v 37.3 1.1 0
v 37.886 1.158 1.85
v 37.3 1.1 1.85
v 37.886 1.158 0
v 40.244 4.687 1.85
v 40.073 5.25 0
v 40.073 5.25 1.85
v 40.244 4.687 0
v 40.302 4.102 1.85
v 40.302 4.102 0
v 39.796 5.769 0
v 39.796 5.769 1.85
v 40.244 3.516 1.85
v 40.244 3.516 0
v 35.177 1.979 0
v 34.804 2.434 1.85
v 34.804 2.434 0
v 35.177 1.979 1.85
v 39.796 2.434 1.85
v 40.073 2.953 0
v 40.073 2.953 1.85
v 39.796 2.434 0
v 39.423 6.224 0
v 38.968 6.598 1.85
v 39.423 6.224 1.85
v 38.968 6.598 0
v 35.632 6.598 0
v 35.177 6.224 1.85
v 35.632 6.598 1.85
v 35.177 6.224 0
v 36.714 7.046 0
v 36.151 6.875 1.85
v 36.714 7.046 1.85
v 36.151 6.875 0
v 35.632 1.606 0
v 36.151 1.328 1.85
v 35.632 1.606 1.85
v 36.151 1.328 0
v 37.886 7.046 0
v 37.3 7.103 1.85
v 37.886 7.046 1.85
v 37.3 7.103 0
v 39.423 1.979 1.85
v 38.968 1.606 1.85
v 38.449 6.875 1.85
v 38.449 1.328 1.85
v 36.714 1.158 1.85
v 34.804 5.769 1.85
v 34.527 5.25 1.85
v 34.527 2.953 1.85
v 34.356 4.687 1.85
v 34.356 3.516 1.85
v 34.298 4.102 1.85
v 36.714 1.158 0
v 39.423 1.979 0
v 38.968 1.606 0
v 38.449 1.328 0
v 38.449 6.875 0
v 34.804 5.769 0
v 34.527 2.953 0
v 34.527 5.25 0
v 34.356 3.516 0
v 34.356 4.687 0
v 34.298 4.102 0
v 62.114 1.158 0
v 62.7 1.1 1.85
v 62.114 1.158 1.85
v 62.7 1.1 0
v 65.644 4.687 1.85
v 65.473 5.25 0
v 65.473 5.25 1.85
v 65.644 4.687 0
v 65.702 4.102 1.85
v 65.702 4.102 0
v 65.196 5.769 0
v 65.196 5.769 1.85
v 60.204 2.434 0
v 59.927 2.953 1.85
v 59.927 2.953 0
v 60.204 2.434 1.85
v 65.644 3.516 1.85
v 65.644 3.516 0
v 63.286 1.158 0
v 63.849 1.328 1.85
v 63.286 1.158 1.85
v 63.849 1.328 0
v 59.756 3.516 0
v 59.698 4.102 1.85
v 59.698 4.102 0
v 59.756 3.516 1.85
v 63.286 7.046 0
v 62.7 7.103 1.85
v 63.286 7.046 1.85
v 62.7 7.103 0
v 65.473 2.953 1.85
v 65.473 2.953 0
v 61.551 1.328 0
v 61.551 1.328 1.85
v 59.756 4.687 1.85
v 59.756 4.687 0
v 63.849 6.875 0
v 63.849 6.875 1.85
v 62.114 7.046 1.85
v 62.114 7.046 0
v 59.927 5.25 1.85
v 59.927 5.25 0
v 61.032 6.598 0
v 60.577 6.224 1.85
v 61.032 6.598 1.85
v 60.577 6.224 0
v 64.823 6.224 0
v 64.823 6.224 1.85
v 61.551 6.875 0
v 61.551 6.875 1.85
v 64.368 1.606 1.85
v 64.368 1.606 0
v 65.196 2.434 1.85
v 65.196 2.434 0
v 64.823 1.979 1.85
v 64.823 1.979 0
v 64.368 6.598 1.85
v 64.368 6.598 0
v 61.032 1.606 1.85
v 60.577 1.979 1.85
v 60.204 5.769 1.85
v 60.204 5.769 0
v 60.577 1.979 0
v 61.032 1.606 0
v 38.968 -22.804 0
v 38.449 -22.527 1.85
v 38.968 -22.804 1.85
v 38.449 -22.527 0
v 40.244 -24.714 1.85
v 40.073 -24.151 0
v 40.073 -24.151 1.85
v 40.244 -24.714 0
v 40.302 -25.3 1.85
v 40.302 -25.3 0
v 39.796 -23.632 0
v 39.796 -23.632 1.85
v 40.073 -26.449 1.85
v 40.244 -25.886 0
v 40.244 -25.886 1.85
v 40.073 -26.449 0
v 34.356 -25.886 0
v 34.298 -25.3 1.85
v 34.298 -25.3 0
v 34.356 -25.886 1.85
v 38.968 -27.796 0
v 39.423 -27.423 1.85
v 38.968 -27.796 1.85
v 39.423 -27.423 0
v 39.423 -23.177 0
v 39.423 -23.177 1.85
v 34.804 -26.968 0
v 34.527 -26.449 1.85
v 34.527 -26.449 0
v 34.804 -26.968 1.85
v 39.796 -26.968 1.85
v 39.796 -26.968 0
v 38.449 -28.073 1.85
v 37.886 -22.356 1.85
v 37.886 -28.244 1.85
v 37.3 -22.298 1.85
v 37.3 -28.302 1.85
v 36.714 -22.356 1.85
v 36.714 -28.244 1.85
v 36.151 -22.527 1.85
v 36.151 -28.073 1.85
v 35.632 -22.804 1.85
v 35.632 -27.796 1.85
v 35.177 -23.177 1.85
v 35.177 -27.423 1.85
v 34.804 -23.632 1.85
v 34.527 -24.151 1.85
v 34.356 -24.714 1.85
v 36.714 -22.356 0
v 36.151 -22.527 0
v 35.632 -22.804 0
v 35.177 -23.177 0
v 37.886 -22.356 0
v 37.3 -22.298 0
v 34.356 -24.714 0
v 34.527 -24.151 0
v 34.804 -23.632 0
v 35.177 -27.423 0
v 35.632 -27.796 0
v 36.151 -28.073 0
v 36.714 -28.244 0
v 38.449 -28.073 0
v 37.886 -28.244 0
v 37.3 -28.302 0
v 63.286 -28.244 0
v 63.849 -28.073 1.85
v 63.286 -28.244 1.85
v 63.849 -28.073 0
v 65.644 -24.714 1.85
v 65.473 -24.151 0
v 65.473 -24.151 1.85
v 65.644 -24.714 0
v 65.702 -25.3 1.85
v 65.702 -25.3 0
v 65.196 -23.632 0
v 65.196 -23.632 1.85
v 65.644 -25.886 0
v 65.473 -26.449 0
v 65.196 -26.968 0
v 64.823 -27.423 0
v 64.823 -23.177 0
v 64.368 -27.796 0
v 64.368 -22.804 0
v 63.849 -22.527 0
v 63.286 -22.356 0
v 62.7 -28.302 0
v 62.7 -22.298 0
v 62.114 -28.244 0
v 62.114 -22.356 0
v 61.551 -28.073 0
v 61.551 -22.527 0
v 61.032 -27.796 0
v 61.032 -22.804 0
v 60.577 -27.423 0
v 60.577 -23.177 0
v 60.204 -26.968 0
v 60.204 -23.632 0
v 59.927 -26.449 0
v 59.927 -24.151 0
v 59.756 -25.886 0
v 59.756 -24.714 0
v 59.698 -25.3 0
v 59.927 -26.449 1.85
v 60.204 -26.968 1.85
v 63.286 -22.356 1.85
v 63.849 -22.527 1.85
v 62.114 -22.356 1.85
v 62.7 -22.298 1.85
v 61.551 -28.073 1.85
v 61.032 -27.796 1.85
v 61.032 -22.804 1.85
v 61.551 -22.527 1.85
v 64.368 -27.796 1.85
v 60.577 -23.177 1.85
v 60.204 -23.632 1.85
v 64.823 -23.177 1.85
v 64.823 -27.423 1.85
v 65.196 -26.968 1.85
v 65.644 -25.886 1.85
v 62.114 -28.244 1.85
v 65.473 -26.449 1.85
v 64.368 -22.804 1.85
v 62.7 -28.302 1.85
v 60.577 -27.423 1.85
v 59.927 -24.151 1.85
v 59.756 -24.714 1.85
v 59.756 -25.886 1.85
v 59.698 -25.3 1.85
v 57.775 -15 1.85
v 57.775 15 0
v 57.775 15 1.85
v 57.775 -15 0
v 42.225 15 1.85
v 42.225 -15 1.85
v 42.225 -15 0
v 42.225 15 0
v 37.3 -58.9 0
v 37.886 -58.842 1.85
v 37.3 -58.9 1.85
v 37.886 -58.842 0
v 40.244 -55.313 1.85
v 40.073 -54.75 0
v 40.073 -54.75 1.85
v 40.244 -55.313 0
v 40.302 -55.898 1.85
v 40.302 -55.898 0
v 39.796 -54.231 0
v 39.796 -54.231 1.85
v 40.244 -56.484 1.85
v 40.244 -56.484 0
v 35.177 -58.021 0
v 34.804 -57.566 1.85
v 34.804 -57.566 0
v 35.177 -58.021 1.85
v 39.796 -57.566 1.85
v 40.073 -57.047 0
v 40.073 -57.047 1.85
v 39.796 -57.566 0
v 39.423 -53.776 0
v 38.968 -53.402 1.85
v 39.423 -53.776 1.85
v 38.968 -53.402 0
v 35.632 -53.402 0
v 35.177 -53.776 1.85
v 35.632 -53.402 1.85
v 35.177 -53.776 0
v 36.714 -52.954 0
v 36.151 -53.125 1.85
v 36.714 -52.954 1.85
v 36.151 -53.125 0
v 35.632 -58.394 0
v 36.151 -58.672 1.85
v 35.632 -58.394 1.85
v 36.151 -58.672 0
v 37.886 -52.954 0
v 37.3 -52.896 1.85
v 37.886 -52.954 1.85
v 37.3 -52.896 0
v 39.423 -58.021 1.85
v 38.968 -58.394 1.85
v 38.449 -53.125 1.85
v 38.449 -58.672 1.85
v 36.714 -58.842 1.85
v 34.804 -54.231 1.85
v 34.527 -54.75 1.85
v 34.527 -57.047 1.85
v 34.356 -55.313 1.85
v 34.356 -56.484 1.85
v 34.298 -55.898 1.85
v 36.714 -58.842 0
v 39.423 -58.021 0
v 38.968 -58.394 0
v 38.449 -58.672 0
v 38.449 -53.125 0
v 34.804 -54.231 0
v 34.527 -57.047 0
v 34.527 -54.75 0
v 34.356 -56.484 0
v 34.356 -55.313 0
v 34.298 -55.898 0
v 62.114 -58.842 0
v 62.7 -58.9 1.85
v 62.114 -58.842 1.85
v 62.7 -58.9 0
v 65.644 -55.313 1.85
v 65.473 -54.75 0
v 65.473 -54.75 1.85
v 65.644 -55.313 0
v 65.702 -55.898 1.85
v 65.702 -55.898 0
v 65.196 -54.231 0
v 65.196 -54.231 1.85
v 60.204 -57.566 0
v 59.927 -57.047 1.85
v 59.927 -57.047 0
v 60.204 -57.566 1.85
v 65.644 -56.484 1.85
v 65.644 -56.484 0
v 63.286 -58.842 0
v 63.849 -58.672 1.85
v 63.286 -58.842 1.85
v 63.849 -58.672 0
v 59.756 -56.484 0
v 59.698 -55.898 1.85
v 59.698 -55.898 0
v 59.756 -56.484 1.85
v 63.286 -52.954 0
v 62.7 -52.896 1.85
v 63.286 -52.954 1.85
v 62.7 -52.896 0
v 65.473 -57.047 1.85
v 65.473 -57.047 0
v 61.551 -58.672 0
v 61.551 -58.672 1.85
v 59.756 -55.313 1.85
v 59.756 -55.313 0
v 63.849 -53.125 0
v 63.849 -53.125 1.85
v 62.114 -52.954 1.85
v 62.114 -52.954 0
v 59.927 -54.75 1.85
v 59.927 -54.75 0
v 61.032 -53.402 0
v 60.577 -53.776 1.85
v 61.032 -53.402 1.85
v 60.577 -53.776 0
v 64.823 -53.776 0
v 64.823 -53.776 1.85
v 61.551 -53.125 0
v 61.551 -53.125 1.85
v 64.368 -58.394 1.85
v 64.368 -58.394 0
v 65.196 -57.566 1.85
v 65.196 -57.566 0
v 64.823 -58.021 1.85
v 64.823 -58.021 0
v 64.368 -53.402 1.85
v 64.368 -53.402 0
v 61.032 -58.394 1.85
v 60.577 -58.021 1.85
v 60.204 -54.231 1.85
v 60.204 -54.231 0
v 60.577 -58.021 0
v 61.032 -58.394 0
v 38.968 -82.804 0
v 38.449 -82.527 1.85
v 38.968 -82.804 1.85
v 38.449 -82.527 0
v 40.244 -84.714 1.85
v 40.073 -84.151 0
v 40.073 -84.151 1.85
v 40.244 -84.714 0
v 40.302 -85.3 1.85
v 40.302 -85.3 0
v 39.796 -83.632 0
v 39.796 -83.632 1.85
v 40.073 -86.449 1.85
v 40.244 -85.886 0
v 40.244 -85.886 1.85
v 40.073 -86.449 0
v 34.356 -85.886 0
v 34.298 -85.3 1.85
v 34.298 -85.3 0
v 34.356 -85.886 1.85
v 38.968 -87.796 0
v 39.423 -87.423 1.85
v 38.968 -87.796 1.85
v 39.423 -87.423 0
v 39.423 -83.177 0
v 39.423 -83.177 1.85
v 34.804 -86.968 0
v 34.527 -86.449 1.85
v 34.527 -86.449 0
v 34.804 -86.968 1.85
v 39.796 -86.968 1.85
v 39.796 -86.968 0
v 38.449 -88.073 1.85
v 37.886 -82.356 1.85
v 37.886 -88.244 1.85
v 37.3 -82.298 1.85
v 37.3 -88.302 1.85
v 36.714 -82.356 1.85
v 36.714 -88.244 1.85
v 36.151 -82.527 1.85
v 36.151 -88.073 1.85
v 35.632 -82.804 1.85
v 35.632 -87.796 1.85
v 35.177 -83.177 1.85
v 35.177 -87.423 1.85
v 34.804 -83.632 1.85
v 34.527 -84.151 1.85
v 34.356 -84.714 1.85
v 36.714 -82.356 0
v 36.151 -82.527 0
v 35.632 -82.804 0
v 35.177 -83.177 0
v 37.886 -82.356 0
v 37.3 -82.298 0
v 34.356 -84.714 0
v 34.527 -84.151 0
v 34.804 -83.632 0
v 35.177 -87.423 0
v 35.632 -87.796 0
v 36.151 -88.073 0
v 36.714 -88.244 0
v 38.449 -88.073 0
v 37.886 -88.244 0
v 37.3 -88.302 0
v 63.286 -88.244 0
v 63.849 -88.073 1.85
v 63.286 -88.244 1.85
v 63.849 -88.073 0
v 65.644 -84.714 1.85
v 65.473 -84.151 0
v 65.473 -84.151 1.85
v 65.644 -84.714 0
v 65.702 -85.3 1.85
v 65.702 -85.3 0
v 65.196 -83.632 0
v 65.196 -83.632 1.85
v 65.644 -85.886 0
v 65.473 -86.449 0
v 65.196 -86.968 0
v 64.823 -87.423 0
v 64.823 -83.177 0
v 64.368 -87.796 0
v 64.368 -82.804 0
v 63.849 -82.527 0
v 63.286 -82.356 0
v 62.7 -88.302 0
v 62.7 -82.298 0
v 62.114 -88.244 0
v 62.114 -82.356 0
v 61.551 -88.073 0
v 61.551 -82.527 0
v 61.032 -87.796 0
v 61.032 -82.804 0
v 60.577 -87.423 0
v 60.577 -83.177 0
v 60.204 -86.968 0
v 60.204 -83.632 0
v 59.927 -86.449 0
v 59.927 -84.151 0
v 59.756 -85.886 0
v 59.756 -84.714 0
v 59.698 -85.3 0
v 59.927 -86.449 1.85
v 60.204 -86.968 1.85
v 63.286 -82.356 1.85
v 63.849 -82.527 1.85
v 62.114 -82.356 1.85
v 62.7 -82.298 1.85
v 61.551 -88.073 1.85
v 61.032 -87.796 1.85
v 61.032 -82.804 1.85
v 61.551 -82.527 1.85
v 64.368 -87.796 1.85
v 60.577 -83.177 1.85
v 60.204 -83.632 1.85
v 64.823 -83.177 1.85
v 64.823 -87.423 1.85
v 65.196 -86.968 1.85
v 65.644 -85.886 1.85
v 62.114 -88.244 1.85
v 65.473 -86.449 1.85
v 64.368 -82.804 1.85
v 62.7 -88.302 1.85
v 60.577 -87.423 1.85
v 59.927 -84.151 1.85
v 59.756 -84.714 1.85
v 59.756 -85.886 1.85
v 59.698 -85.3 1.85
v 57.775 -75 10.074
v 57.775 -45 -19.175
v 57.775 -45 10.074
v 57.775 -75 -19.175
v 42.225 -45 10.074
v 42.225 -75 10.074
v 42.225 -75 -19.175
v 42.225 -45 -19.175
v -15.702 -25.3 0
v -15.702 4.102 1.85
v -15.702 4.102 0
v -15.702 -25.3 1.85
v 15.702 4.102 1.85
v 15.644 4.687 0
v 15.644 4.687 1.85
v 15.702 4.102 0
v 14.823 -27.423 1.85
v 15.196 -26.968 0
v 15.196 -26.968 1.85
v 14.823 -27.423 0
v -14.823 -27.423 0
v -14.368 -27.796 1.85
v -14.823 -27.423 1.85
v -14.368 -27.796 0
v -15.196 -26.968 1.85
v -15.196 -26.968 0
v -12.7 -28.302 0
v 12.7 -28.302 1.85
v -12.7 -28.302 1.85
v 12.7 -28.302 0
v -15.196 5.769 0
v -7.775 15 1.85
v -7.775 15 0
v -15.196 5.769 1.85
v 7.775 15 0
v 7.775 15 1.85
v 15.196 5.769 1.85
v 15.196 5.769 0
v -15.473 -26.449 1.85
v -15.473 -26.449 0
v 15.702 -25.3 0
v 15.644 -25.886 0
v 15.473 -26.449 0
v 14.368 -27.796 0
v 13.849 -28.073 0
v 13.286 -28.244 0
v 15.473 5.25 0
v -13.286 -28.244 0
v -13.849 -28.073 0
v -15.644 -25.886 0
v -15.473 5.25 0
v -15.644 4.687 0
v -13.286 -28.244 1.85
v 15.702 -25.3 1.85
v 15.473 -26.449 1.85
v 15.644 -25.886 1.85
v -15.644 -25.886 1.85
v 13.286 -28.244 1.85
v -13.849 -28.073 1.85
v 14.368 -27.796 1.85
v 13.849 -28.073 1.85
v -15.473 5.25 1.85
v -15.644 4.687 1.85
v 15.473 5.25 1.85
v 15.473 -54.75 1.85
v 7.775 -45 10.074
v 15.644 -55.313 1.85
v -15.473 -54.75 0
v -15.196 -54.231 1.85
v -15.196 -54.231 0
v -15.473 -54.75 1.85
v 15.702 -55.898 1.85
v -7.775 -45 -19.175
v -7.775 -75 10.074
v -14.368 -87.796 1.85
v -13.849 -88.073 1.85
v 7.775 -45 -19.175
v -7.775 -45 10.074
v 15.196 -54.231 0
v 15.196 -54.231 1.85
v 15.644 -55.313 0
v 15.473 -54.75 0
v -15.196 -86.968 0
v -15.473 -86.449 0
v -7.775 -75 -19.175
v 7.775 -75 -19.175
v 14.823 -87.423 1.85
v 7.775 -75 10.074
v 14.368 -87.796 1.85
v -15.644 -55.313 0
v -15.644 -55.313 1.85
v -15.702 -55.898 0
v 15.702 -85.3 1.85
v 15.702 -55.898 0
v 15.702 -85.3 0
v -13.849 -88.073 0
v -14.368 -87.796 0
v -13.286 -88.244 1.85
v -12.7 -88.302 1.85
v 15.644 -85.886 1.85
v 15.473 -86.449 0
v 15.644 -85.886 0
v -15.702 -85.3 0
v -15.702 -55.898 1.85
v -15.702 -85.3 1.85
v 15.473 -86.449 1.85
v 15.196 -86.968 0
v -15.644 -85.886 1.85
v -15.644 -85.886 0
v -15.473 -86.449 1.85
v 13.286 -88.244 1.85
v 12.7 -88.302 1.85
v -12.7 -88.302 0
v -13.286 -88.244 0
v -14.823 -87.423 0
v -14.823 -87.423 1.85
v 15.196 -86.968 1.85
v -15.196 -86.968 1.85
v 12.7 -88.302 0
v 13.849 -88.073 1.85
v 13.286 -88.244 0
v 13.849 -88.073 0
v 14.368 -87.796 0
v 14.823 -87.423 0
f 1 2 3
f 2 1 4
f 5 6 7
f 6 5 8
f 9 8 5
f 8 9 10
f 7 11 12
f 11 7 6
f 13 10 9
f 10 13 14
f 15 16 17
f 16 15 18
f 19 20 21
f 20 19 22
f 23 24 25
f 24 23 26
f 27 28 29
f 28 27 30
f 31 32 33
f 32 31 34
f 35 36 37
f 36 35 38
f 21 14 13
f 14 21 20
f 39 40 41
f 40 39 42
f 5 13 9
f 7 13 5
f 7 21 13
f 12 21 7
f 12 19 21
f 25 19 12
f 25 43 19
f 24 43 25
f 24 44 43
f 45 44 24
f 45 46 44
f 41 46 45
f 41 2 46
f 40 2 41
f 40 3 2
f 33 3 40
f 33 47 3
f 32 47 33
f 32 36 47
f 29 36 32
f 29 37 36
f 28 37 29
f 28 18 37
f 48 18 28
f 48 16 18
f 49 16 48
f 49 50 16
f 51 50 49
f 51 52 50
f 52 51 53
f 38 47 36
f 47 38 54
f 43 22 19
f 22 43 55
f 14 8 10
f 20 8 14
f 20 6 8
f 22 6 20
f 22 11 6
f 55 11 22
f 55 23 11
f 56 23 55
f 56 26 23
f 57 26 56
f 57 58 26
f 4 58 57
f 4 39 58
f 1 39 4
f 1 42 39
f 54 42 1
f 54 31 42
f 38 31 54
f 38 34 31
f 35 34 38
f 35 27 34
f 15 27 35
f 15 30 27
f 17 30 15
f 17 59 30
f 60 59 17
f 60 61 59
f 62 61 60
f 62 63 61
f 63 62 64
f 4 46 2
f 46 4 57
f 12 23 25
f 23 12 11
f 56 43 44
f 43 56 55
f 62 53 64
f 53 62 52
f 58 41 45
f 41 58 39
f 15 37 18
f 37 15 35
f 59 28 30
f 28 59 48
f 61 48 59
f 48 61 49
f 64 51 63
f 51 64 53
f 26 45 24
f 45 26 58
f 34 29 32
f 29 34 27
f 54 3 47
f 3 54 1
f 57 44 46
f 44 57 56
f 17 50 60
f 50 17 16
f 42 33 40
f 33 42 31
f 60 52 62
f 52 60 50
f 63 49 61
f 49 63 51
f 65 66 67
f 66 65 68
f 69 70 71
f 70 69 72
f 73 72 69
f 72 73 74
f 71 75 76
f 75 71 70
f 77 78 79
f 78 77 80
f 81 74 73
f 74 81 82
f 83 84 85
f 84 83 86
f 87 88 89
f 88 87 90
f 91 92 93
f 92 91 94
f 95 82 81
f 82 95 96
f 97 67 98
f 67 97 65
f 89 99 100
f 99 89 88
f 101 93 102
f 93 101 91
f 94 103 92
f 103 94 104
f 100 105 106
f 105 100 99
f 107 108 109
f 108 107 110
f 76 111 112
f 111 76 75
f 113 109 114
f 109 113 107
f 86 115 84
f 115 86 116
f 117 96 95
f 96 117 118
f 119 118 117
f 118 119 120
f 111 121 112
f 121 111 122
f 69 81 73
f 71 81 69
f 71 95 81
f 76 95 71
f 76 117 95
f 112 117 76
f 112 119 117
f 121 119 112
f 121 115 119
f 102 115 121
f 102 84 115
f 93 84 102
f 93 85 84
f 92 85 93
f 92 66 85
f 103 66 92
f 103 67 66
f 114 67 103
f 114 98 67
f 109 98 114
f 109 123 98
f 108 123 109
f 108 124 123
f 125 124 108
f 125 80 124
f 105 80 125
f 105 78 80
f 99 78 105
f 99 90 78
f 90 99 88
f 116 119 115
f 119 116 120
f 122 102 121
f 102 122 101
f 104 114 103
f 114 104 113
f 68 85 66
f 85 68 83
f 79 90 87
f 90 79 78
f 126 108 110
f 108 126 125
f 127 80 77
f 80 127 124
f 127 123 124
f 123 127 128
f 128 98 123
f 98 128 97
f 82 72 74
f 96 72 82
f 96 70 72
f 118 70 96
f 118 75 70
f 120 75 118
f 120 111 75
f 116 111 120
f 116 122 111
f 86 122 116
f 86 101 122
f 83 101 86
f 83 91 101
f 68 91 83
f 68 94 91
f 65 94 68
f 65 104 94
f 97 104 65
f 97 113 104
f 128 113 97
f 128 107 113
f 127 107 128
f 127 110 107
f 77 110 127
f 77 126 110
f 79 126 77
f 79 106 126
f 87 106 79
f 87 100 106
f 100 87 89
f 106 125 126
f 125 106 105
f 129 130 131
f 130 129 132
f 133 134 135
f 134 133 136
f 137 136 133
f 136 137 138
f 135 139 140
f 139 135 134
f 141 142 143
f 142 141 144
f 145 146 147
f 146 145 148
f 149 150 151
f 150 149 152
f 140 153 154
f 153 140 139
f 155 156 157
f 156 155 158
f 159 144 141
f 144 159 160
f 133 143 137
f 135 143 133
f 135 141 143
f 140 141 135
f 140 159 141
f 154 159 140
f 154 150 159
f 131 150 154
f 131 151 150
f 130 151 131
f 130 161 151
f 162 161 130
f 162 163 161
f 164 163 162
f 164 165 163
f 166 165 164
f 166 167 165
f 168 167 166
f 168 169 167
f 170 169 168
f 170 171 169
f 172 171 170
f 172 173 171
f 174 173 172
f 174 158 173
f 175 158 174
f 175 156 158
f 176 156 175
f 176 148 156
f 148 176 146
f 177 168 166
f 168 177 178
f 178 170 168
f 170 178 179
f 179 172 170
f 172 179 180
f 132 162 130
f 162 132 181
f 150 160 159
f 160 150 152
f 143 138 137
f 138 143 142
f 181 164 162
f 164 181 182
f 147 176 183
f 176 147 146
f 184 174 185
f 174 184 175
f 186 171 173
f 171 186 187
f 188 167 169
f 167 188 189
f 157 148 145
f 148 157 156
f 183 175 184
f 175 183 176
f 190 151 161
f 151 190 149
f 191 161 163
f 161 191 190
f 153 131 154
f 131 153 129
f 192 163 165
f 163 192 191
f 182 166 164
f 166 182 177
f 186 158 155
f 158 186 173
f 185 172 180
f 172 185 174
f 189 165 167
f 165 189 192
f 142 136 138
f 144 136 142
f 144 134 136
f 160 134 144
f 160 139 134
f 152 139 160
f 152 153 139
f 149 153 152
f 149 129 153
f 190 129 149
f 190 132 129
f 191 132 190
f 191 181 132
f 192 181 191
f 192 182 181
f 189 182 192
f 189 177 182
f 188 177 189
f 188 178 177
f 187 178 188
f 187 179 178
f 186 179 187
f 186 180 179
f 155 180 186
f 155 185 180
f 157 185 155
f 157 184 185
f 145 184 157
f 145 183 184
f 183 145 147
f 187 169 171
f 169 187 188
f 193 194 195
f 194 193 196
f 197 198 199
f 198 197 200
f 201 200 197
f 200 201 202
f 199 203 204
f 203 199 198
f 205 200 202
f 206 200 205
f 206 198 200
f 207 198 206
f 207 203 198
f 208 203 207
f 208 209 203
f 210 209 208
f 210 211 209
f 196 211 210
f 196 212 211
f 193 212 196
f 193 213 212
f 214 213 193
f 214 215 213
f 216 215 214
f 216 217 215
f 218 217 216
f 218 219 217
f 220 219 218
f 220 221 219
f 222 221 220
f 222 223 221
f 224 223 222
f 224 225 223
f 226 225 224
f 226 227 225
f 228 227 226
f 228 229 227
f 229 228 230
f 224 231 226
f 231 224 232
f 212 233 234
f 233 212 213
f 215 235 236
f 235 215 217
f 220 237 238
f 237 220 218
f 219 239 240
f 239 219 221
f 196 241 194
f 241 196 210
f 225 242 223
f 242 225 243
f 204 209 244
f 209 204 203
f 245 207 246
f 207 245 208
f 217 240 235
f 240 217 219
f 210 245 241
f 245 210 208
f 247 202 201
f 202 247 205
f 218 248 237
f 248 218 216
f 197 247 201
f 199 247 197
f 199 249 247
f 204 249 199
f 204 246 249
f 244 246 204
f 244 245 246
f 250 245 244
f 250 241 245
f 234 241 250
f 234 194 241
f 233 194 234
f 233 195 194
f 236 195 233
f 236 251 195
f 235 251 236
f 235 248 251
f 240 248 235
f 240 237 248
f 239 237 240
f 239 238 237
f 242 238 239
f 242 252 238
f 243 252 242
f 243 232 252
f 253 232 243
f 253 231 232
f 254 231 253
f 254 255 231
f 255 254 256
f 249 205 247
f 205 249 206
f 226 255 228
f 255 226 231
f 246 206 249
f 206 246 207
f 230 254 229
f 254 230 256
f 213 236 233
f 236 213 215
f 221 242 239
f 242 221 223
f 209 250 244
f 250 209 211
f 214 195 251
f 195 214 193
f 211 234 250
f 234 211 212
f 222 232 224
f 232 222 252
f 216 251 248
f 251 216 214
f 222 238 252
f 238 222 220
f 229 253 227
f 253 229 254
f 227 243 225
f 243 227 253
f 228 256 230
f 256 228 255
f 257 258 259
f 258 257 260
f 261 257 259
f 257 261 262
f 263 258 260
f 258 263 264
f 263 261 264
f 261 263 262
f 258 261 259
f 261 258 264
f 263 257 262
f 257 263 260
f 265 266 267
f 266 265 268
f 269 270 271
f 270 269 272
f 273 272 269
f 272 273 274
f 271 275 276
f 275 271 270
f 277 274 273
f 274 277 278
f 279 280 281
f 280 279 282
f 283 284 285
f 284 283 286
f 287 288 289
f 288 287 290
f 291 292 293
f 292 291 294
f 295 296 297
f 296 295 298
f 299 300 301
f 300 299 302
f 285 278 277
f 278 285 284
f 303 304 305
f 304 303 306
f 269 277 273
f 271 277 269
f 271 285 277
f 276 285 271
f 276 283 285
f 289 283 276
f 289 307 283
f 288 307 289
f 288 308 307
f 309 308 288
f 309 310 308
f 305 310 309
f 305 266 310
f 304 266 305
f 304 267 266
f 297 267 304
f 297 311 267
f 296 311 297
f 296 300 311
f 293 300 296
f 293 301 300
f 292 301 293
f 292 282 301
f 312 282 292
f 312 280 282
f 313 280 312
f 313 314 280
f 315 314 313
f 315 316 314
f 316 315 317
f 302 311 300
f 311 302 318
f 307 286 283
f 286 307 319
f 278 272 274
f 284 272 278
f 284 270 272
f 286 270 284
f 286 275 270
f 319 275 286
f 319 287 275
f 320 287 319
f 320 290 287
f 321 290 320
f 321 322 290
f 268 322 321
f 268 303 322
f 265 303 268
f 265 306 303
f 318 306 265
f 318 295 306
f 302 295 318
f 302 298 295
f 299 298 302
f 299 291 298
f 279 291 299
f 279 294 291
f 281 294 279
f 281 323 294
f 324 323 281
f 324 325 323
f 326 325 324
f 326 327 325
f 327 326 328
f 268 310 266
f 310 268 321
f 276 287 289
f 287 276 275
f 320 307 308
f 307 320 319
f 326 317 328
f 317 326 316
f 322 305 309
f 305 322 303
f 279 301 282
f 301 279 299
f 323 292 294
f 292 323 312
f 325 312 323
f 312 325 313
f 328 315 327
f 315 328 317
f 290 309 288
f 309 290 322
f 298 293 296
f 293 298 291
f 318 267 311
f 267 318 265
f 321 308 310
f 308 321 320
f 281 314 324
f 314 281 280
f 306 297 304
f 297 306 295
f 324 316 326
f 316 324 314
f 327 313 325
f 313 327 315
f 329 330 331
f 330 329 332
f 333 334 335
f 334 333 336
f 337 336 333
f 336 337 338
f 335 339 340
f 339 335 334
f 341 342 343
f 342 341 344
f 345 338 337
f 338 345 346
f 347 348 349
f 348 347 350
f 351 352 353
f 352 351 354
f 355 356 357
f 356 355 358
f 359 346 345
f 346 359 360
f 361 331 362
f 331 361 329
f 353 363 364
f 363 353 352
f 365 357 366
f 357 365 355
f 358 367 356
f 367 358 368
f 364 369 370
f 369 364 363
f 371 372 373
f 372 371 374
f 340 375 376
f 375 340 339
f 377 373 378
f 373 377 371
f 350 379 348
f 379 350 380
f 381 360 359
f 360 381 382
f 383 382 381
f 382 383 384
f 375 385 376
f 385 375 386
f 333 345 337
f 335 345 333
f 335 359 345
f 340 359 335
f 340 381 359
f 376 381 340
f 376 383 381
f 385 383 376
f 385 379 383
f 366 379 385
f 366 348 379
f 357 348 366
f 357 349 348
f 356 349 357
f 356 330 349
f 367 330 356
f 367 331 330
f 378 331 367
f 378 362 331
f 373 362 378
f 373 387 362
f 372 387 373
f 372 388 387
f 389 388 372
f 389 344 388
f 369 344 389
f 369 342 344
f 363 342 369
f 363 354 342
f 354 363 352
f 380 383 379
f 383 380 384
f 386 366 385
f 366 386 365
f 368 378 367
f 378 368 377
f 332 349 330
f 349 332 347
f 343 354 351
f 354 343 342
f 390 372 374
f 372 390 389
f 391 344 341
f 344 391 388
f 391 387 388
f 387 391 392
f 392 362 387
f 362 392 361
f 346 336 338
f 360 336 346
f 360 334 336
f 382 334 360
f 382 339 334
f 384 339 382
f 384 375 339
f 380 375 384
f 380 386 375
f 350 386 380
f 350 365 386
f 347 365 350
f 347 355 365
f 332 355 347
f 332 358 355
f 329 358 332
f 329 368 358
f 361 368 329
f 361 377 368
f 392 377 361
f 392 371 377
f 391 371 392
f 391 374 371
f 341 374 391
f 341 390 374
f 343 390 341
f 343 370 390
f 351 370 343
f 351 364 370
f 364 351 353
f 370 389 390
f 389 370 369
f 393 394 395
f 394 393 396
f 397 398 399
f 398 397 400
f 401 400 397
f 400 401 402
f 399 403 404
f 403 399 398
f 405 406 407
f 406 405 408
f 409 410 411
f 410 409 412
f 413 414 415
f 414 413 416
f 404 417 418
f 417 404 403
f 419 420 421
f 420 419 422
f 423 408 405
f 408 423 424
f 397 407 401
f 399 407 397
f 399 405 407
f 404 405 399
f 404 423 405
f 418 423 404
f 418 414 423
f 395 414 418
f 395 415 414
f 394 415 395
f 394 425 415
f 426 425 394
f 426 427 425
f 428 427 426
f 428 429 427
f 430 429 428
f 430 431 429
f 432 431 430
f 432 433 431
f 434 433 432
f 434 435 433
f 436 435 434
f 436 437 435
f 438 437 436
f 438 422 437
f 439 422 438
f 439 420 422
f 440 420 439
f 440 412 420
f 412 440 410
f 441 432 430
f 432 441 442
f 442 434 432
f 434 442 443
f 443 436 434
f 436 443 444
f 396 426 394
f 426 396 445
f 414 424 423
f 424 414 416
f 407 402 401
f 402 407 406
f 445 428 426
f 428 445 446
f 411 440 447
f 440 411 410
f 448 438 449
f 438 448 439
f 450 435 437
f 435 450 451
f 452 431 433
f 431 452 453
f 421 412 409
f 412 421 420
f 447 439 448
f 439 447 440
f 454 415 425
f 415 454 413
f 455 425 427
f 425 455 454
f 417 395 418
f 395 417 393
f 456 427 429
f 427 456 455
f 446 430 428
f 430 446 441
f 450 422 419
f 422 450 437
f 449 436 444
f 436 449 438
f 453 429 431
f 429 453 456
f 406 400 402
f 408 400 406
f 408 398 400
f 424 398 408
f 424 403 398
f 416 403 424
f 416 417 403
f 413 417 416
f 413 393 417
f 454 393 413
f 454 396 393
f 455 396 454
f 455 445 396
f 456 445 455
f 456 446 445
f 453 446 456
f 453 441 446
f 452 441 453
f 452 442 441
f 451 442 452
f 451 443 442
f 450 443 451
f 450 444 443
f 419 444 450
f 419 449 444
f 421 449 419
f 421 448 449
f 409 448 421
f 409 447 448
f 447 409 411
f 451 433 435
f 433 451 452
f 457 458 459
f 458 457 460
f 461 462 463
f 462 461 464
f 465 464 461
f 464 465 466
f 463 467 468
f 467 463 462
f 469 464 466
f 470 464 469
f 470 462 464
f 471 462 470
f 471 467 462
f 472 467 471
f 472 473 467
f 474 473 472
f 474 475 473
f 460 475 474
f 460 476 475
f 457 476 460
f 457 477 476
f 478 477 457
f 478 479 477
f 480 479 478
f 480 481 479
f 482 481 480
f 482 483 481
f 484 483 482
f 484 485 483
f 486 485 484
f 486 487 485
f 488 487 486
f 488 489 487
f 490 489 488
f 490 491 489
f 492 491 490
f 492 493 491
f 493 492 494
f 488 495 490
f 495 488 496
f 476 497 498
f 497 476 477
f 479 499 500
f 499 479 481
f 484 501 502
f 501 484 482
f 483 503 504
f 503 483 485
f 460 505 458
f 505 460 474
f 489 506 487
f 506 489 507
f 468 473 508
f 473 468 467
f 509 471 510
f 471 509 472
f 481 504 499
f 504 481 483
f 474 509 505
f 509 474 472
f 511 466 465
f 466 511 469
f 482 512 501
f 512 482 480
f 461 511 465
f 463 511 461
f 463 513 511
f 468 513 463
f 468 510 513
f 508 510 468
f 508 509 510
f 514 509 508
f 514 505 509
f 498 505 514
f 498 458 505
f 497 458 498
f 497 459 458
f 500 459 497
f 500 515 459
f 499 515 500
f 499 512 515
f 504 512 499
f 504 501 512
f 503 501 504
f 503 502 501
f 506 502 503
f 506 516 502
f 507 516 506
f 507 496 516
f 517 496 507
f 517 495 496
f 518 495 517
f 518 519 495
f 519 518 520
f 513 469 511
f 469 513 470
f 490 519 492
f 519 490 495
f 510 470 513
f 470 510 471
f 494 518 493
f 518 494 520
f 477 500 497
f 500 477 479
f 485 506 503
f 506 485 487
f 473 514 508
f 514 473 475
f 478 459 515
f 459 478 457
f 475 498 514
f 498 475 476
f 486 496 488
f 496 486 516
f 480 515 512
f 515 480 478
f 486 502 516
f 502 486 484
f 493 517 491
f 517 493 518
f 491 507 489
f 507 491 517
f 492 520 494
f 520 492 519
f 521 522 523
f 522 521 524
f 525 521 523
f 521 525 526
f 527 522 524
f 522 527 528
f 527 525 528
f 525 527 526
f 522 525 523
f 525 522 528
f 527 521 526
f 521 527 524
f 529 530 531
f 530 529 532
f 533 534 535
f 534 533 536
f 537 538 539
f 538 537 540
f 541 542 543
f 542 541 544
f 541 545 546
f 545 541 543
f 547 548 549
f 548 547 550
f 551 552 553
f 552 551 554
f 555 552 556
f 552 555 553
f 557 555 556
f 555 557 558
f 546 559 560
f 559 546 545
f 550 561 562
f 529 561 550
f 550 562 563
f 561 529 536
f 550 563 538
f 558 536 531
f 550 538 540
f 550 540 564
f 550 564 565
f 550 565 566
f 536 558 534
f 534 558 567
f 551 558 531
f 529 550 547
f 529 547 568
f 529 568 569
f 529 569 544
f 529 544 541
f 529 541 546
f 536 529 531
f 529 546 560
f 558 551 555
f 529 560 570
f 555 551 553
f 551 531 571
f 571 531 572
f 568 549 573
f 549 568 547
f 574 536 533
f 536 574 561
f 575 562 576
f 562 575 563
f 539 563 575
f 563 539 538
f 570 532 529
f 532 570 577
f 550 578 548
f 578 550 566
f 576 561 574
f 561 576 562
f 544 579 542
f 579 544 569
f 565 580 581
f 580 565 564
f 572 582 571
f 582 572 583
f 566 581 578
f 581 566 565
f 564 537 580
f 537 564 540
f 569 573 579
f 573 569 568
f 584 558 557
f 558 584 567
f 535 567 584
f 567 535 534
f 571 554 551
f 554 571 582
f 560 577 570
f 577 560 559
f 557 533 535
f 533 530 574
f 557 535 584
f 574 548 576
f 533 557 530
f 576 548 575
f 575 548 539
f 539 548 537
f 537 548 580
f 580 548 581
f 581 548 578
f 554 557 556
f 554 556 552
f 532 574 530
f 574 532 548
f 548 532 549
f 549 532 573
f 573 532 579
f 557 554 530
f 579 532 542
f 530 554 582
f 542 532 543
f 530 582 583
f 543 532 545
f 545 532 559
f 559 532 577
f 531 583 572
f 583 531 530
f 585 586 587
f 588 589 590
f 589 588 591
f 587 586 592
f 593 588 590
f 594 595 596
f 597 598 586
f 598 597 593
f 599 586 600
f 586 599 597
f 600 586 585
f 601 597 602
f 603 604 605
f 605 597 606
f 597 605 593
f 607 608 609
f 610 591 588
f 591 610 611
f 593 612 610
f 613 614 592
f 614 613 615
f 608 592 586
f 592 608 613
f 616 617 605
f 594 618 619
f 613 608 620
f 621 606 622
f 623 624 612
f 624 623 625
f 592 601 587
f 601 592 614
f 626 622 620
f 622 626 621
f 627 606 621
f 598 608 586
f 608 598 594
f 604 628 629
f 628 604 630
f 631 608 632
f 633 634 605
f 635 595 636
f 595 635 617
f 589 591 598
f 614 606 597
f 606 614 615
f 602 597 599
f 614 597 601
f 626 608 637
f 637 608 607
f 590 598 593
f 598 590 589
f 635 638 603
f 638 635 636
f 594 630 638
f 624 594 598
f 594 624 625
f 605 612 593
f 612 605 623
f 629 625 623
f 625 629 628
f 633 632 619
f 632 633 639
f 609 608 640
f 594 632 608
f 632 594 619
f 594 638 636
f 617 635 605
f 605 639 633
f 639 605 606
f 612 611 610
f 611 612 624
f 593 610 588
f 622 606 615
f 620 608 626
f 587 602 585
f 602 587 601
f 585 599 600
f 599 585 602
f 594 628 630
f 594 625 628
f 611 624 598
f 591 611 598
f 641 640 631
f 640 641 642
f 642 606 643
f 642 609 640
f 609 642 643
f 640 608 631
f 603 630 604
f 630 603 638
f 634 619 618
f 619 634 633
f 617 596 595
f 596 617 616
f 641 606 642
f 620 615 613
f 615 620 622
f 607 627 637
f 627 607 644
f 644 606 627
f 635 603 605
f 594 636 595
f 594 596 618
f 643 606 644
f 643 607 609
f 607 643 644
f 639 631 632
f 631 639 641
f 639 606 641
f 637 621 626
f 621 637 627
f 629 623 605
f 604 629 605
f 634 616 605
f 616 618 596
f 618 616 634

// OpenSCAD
// hull_cyl_cube_test.scad
//
// Test case for: hull(4 cylinders + 1 cube)
// Taken from the pegboard import — the failing hull in the X-aligned frame.
//
// The perpendicular cross-section (YZ plane for X-aligned cylinders) has:
//   - 4 cylinder circles at (y=±12.7, z=4.10175) and (y=±12.7, z=-25.3), r=3.00175
//   - Cube cross-section: y ∈ [-7.775, 7.775], z ∈ [-15, 15]
//
// For easier viewing we display this in a Z-axis-up frame by mapping:
//   Y_perp → X,   Z_perp → Y,   X_axis → Z
//
// So the 4 cylinders become Z-aligned pegs, and the cube is a tall slab.
// The axial extent (X in the original) becomes Z depth of 1.85.

r   = 3.00175;
h   = 1.85;     // axial length of cylinders (X in original frame)

// Cylinder centre positions (in the YZ perpendicular plane → mapped to XY here)
cyl_pos = [
    [-12.7,   4.10175],   // (y=-12.7, z=4.10175) in original
    [ 12.7,   4.10175],
    [-12.7, -25.3    ],
    [ 12.7, -25.3    ],
];

// Cube cross-section in YZ → XY
// y ∈ [-7.775, 7.775], z ∈ [-15, 15], axial depth 1.85 (same as cylinders)
cube_x0 = -7.775;   cube_sx = 15.55;
cube_y0 = -15.0;    cube_sy = 30.0;
cube_z0 =  0.0;     cube_sz =  1.85;  // same axial depth for direct comparison

// --------------------------------------------------------------------------
// Modules
// --------------------------------------------------------------------------

module cylinders() {
    for (p = cyl_pos)
        translate([p[0], p[1], 0])
            cylinder(h=h, r=r, $fn=32);
}

module the_cube() {
    translate([cube_x0, cube_y0, cube_z0])
        cube([cube_sx, cube_sy, cube_sz]);
}

// --------------------------------------------------------------------------
// Show: hull (left) vs union (right)
// --------------------------------------------------------------------------

// Hull — what OpenSCAD produces (correct convex hull)
color("SteelBlue", 0.9)
hull() {
    cylinders();
    the_cube();
}

// Union — what a simple fuse of the shapes would give
translate([50, 0, 0])
color("Tomato", 0.9)
union() {
    cylinders();
    the_cube();
}

// --------------------------------------------------------------------------
// Also show the hull using the FULL cube depth (axial extent of the cube
// is 29.25 mm vs cylinder 1.85 mm — so cube extends far beyond cylinders).
// This reveals the slanted transition faces clearly.
// --------------------------------------------------------------------------

translate([0, -60, 0]) {
    // Cube with full axial extent
    cube_full_sz = 29.25;
    cube_full_z0 = -19.1755;   // cube starts at x=-19.1755 in original

    color("SteelBlue", 0.8)
    hull() {
        cylinders();
        translate([cube_x0, cube_y0, cube_full_z0])
            cube([cube_sx, cube_sy, cube_full_sz]);
    }
}

translate([50, -60, 0]) {
    cube_full_sz = 29.25;
    cube_full_z0 = -19.1755;

    color("Tomato", 0.8)
    union() {
        cylinders();
        translate([cube_x0, cube_y0, cube_full_z0])
            cube([cube_sx, cube_sy, cube_full_sz]);
    }
}
